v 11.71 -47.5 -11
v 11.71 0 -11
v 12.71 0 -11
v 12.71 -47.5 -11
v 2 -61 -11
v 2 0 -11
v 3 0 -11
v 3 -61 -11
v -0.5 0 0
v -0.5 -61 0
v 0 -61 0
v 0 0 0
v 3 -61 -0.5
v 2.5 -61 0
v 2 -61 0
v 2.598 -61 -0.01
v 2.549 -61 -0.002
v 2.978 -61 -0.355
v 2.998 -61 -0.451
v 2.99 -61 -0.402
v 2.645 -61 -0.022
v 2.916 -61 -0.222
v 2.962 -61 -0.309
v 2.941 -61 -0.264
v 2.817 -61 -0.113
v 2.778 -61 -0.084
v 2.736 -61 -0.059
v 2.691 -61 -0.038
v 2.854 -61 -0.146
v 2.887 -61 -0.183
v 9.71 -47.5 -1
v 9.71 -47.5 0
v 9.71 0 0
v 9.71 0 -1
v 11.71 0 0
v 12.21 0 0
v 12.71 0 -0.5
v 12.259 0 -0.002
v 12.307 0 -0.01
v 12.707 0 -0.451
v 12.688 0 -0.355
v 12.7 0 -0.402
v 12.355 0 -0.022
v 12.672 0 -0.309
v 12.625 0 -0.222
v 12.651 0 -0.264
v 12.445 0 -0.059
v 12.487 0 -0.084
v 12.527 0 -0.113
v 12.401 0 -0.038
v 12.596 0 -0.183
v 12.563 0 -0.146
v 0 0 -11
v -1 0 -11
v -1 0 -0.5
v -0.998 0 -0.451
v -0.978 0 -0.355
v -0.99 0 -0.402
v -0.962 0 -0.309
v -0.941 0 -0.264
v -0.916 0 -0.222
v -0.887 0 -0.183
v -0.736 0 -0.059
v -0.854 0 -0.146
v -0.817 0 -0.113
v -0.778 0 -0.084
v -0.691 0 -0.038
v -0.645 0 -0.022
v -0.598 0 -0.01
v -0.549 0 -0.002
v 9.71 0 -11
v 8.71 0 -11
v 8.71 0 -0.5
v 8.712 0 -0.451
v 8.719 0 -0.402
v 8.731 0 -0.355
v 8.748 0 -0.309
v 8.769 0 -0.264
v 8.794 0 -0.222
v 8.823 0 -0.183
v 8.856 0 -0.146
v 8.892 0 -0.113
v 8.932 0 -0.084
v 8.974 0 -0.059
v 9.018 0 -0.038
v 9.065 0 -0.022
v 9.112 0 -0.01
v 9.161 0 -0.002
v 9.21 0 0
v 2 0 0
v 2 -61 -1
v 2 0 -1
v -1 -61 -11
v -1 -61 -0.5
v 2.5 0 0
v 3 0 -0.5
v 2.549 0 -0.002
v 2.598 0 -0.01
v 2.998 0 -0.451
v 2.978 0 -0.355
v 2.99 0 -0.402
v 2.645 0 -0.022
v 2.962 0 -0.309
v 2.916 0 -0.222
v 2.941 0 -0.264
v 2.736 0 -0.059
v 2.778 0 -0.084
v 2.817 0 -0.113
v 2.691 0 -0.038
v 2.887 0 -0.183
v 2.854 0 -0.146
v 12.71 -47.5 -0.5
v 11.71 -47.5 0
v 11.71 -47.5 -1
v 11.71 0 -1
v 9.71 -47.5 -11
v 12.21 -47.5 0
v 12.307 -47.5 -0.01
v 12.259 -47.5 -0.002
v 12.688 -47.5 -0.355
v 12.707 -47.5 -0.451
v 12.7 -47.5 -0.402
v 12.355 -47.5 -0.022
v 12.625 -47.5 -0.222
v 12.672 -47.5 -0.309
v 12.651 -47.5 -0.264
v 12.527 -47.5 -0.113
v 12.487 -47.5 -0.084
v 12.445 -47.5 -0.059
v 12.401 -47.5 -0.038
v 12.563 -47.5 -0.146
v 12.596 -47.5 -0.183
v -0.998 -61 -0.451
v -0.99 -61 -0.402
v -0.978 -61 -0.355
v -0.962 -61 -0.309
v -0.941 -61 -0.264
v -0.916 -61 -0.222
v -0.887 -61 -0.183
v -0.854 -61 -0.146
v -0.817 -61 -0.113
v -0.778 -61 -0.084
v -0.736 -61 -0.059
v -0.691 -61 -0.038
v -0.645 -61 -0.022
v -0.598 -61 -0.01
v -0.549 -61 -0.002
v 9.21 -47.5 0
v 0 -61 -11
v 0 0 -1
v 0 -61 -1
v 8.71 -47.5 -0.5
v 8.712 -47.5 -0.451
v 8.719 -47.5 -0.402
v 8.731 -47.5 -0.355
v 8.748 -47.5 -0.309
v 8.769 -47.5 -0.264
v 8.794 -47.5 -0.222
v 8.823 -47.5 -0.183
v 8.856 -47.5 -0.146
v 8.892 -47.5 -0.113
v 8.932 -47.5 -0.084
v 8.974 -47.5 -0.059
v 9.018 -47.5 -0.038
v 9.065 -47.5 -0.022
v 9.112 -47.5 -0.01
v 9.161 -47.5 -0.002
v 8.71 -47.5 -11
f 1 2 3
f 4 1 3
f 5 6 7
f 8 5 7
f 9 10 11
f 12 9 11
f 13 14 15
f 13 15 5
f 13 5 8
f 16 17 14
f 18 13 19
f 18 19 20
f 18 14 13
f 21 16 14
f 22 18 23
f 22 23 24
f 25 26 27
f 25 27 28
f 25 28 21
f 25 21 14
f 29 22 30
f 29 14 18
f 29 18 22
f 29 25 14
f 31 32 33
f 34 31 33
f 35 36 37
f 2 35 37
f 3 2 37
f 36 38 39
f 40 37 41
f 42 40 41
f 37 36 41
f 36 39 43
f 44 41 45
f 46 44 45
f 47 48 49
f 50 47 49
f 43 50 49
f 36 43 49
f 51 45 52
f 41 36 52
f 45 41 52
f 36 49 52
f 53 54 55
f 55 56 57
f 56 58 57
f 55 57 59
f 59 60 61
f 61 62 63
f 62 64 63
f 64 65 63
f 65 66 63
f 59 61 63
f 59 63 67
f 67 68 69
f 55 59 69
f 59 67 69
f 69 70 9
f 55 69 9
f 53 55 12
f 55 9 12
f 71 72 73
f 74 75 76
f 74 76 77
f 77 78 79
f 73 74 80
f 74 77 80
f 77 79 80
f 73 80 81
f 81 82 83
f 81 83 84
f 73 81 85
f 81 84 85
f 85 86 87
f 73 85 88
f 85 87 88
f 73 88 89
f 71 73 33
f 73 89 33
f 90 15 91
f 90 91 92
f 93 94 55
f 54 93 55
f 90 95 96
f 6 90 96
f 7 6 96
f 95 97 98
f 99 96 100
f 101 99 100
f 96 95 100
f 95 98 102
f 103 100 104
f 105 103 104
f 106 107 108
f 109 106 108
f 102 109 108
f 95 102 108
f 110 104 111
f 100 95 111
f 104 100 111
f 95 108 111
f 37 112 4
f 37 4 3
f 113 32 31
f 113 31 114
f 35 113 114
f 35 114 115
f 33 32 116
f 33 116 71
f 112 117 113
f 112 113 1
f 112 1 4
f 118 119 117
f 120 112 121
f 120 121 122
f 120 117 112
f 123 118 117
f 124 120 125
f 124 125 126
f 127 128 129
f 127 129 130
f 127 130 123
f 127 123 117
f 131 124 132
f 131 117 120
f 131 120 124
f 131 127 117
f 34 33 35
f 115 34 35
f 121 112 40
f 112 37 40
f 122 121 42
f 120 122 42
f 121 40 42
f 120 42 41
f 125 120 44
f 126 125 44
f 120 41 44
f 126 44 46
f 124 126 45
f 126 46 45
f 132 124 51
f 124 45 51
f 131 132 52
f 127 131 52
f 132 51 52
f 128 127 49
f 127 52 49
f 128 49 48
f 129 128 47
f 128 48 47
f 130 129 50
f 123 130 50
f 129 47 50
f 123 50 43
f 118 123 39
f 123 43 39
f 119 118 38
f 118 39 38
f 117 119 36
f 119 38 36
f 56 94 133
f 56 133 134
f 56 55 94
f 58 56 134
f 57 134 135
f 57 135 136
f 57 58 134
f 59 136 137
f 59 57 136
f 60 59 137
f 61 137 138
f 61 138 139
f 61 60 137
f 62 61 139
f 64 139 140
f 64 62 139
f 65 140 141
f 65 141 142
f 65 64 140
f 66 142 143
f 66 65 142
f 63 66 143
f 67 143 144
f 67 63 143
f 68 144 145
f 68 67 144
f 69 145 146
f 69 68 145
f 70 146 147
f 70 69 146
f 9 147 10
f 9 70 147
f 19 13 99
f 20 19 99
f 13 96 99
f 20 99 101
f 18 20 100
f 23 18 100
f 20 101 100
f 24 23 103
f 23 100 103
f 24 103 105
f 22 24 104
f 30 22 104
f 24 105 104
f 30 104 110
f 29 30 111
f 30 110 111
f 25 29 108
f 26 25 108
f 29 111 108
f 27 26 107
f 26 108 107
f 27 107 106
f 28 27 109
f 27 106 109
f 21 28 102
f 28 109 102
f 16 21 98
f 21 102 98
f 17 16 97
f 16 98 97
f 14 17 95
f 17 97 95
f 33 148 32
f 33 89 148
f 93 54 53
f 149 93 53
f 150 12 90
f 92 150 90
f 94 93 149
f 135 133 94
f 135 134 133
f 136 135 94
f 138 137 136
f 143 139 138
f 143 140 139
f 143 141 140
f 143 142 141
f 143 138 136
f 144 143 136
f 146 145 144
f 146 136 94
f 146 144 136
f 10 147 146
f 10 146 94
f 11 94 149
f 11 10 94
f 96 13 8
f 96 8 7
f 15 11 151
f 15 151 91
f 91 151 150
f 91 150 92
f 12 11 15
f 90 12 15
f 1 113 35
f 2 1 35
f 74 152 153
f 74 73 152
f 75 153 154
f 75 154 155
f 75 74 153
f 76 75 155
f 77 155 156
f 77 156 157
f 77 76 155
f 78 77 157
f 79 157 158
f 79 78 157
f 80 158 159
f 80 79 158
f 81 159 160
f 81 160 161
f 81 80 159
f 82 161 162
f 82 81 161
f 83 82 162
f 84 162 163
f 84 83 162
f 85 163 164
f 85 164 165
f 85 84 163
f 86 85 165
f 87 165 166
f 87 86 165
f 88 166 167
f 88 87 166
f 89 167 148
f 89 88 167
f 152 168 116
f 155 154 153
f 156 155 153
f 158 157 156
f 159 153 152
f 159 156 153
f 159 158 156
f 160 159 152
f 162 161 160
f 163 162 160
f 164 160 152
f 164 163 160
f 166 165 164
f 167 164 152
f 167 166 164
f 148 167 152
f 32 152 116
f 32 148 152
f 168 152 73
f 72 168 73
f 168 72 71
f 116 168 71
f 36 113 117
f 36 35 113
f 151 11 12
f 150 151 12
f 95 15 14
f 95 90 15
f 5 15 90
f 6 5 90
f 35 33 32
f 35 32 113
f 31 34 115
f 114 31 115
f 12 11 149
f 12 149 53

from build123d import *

# Parameters (mm, degrees)
F0_W     = 2
F0_H     = 61
F0_H_2   = 47.5
F1_DEPTH = 1
F0_W_2   = 1
F2_DEPTH = 11
F3_R     = 0.5


with BuildPart() as f1:
    # F0 (on Top) → F1 (new body)
    with BuildSketch(Plane.XY):
        with Locations((1, -30.5)):
            Rectangle(F0_W, F0_H)
        with Locations((10.709677, -23.75)):
            Rectangle(F0_W, F0_H_2)
    extrude(amount=-F1_DEPTH)


with BuildPart() as f2:
    # F0 (on Top) → F2 (new body)
    with BuildSketch(Plane.XY):
        with Locations((2.5, -30.5)):
            Rectangle(F0_W_2, F0_H)
        with Locations((9.209677, -23.75)):
            Rectangle(F0_W_2, F0_H_2)
        with Locations((12.209677, -23.75)):
            Rectangle(F0_W_2, F0_H_2)
        with Locations((-0.5, -30.5)):
            Rectangle(F0_W_2, F0_H)
    extrude(amount=-F2_DEPTH)

    # F3
    f3_edges = [f2.edges().sort_by_distance(p)[0] for p in [
        (-1, -30.5, 0),
        (3, -30.5, 0),
        (8.709677, -23.75, 0),
        (12.709677, -23.75, 0),
    ]]
    fillet(f3_edges, radius=F3_R)


solid = Compound([f1.part, f2.part])
